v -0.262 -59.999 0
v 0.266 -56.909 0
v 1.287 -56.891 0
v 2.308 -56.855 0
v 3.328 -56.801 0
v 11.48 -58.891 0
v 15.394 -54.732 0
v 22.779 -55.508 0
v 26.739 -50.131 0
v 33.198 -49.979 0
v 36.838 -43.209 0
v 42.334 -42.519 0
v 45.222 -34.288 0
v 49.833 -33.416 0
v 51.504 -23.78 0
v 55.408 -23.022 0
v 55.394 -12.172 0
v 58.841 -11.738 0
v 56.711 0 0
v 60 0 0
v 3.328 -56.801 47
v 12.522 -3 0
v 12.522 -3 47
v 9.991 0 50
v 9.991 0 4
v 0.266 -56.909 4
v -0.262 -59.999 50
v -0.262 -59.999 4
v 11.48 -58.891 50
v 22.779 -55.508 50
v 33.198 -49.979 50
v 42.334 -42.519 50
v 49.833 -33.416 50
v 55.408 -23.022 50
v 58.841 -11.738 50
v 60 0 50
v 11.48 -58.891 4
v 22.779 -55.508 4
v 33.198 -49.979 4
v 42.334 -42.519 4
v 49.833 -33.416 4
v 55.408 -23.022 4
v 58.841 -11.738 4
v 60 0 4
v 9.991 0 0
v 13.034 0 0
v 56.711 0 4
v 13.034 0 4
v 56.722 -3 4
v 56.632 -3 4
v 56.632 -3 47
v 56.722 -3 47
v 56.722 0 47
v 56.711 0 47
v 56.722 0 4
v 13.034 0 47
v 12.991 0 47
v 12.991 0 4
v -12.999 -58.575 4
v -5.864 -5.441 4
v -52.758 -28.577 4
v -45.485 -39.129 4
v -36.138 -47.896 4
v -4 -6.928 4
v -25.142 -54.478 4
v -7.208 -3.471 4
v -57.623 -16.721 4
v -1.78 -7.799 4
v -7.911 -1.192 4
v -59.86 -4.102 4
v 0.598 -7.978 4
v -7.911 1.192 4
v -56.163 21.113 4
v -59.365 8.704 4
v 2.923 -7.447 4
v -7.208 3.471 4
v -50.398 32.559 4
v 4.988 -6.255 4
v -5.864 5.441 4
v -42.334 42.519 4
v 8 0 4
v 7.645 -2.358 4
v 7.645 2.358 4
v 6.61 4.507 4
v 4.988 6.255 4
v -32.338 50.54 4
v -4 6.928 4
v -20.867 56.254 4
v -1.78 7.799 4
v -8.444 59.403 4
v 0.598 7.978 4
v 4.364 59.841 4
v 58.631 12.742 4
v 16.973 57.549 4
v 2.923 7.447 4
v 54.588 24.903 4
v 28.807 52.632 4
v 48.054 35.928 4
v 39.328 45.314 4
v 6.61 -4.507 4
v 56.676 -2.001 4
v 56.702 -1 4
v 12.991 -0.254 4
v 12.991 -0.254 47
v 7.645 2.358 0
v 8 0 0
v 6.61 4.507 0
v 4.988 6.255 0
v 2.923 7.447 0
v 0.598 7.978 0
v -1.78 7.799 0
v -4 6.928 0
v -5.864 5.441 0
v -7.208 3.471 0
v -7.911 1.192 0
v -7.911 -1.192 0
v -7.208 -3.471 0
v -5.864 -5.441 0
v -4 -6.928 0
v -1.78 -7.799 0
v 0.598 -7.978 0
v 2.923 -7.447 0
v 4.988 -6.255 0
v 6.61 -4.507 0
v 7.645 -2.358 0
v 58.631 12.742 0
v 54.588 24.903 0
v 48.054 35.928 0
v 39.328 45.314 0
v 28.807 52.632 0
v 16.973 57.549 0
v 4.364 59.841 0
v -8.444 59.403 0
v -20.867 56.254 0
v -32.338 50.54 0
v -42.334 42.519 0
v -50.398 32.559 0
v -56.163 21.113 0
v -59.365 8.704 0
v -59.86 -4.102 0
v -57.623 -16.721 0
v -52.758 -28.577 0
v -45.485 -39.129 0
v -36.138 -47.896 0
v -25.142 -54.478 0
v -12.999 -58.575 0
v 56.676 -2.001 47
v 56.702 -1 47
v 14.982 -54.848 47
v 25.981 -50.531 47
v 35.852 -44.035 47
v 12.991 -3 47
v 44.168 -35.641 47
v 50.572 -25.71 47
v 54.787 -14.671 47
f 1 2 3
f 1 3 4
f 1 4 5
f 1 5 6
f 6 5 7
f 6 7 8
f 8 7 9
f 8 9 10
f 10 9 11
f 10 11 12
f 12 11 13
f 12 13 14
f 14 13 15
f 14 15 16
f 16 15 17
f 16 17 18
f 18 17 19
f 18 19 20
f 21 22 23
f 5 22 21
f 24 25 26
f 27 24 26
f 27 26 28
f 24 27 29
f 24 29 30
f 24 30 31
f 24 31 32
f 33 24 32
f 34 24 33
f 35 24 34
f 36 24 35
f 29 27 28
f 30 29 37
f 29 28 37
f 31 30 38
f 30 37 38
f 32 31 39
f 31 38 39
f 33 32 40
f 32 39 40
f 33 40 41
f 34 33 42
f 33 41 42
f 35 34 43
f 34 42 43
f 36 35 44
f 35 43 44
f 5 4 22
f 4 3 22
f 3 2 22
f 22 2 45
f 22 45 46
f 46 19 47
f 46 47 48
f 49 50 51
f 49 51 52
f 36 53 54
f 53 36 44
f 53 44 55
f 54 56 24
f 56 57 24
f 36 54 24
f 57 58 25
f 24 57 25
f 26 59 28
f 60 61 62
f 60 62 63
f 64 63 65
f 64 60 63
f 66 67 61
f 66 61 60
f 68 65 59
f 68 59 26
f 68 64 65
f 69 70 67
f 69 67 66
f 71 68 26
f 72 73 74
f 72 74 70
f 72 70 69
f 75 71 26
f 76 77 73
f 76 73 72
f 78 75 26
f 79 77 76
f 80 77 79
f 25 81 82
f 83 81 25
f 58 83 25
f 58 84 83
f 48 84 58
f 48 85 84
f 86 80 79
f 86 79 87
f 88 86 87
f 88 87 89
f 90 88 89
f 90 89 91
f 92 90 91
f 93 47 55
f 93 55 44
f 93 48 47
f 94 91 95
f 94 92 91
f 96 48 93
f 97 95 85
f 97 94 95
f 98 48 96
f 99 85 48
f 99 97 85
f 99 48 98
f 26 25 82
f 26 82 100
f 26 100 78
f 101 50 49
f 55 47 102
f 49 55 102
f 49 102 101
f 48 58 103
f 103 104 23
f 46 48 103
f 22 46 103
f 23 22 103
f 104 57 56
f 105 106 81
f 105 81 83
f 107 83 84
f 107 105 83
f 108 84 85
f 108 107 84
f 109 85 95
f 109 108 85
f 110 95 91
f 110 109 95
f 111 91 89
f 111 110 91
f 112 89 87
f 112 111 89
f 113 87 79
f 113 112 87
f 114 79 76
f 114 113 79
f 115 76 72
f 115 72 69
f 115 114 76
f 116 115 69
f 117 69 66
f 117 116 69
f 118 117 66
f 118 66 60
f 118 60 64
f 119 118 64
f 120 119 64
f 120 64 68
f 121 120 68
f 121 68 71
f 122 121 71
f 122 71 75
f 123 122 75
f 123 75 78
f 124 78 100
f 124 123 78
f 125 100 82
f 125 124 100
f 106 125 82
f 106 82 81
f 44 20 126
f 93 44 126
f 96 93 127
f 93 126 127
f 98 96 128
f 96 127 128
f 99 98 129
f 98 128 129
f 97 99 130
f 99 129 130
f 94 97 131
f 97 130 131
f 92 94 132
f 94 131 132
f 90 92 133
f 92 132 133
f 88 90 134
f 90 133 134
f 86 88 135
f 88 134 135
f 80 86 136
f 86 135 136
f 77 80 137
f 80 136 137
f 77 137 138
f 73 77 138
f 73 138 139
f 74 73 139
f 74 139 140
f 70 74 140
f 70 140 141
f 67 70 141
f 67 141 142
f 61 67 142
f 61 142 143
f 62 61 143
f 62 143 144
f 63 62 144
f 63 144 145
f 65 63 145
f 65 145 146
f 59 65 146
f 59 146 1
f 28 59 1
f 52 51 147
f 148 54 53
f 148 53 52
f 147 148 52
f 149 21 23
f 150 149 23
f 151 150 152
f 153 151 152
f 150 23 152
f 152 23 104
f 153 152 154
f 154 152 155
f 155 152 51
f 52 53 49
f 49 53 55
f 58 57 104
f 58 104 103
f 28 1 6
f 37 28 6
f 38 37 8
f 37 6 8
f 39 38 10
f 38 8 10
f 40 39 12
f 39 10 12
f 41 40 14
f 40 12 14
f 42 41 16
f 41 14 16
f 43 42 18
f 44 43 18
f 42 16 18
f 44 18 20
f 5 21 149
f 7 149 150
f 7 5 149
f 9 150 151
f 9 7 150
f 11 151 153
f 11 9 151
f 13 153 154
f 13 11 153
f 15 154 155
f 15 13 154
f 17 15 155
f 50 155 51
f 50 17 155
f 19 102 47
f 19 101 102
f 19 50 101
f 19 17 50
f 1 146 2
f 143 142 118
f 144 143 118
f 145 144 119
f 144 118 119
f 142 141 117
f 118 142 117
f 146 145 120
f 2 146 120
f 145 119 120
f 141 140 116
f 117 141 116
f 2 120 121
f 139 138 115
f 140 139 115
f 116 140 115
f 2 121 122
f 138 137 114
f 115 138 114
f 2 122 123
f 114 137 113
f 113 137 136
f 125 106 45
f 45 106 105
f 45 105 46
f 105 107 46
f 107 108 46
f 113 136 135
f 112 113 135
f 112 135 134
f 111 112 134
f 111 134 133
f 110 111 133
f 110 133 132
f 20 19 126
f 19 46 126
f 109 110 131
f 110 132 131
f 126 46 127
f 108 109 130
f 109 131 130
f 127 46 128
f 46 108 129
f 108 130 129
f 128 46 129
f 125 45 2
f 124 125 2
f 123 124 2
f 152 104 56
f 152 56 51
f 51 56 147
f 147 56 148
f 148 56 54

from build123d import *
from build123d.topology import SkipClean

# Parameters (mm, degrees)
SKETCH1_R           = 60
SKETCH1_R_2         = 8
BOSS_EXTRUDE1_DEPTH = 4
BOSS_EXTRUDE2_DEPTH = 50
CUT_EXTRUDE1_DEPTH  = 47
SKETCH3_W           = 43.731073279
SKETCH3_H           = 43
CUT_EXTRUDE3_DEPTH  = 3


with BuildPart() as part:
    # Sketch1 → Boss-Extrude1 (new body)
    with BuildSketch(Plane.XY):
        Circle(SKETCH1_R)
        with BuildLine():
            Line((0.265819003, -56.90851166), (9.990859575, 0))
            Line((9.990859575, 0), (56.710923629, 0))
            ThreePointArc((56.710923629, 0), (40.206313594, -40.076778693), (0.265819003, -56.90851166))
        make_face(mode=Mode.SUBTRACT)
        Circle(SKETCH1_R_2, mode=Mode.SUBTRACT)
    extrude(amount=BOSS_EXTRUDE1_DEPTH)

    # Sketch1<3> → Boss-Extrude2 (add)
    with SkipClean():  # the faces are left unmerged after this step: merging them gives an invalid solid
        with BuildSketch(Plane.XY):
            with BuildLine():
                Line((60, 0), (9.990859575, 0))
                Line((9.990859575, 0), (-0.26238441, -59.999426284))
                ThreePointArc((-0.26238441, -59.999426284), (42.333538332, -42.519072571), (60, 0))
            make_face()
        extrude(amount=BOSS_EXTRUDE2_DEPTH)

    # Sketch1<6> → Cut-Extrude1 (cut)
    with SkipClean():  # the faces are left unmerged after this step: merging them gives an invalid solid
        with BuildSketch(Plane.XY):
            with BuildLine():
                ThreePointArc((3.3276834, -56.800985601), (41.2704357, -38.974638406), (56.710923629, 0))
                Line((56.710923629, 0), (13.034348947, 0))
                Line((13.034348947, 0), (12.521681846, -3))
                Line((12.521681846, -3), (3.3276834, -56.800985601))
            make_face()
        extrude(amount=CUT_EXTRUDE1_DEPTH, mode=Mode.SUBTRACT)

    # Sketch3 → Cut-Extrude3 (cut)
    with SkipClean():  # the faces are left unmerged after this step: merging them gives an invalid solid
        with BuildSketch(Plane(origin=(0, 0, 0), x_dir=(1, 0, 0), z_dir=(0, 1, 0))):
            with Locations((34.856396215, -25.5)):
                Rectangle(SKETCH3_W, SKETCH3_H)
        extrude(amount=-CUT_EXTRUDE3_DEPTH, mode=Mode.SUBTRACT)


solid = part.part
